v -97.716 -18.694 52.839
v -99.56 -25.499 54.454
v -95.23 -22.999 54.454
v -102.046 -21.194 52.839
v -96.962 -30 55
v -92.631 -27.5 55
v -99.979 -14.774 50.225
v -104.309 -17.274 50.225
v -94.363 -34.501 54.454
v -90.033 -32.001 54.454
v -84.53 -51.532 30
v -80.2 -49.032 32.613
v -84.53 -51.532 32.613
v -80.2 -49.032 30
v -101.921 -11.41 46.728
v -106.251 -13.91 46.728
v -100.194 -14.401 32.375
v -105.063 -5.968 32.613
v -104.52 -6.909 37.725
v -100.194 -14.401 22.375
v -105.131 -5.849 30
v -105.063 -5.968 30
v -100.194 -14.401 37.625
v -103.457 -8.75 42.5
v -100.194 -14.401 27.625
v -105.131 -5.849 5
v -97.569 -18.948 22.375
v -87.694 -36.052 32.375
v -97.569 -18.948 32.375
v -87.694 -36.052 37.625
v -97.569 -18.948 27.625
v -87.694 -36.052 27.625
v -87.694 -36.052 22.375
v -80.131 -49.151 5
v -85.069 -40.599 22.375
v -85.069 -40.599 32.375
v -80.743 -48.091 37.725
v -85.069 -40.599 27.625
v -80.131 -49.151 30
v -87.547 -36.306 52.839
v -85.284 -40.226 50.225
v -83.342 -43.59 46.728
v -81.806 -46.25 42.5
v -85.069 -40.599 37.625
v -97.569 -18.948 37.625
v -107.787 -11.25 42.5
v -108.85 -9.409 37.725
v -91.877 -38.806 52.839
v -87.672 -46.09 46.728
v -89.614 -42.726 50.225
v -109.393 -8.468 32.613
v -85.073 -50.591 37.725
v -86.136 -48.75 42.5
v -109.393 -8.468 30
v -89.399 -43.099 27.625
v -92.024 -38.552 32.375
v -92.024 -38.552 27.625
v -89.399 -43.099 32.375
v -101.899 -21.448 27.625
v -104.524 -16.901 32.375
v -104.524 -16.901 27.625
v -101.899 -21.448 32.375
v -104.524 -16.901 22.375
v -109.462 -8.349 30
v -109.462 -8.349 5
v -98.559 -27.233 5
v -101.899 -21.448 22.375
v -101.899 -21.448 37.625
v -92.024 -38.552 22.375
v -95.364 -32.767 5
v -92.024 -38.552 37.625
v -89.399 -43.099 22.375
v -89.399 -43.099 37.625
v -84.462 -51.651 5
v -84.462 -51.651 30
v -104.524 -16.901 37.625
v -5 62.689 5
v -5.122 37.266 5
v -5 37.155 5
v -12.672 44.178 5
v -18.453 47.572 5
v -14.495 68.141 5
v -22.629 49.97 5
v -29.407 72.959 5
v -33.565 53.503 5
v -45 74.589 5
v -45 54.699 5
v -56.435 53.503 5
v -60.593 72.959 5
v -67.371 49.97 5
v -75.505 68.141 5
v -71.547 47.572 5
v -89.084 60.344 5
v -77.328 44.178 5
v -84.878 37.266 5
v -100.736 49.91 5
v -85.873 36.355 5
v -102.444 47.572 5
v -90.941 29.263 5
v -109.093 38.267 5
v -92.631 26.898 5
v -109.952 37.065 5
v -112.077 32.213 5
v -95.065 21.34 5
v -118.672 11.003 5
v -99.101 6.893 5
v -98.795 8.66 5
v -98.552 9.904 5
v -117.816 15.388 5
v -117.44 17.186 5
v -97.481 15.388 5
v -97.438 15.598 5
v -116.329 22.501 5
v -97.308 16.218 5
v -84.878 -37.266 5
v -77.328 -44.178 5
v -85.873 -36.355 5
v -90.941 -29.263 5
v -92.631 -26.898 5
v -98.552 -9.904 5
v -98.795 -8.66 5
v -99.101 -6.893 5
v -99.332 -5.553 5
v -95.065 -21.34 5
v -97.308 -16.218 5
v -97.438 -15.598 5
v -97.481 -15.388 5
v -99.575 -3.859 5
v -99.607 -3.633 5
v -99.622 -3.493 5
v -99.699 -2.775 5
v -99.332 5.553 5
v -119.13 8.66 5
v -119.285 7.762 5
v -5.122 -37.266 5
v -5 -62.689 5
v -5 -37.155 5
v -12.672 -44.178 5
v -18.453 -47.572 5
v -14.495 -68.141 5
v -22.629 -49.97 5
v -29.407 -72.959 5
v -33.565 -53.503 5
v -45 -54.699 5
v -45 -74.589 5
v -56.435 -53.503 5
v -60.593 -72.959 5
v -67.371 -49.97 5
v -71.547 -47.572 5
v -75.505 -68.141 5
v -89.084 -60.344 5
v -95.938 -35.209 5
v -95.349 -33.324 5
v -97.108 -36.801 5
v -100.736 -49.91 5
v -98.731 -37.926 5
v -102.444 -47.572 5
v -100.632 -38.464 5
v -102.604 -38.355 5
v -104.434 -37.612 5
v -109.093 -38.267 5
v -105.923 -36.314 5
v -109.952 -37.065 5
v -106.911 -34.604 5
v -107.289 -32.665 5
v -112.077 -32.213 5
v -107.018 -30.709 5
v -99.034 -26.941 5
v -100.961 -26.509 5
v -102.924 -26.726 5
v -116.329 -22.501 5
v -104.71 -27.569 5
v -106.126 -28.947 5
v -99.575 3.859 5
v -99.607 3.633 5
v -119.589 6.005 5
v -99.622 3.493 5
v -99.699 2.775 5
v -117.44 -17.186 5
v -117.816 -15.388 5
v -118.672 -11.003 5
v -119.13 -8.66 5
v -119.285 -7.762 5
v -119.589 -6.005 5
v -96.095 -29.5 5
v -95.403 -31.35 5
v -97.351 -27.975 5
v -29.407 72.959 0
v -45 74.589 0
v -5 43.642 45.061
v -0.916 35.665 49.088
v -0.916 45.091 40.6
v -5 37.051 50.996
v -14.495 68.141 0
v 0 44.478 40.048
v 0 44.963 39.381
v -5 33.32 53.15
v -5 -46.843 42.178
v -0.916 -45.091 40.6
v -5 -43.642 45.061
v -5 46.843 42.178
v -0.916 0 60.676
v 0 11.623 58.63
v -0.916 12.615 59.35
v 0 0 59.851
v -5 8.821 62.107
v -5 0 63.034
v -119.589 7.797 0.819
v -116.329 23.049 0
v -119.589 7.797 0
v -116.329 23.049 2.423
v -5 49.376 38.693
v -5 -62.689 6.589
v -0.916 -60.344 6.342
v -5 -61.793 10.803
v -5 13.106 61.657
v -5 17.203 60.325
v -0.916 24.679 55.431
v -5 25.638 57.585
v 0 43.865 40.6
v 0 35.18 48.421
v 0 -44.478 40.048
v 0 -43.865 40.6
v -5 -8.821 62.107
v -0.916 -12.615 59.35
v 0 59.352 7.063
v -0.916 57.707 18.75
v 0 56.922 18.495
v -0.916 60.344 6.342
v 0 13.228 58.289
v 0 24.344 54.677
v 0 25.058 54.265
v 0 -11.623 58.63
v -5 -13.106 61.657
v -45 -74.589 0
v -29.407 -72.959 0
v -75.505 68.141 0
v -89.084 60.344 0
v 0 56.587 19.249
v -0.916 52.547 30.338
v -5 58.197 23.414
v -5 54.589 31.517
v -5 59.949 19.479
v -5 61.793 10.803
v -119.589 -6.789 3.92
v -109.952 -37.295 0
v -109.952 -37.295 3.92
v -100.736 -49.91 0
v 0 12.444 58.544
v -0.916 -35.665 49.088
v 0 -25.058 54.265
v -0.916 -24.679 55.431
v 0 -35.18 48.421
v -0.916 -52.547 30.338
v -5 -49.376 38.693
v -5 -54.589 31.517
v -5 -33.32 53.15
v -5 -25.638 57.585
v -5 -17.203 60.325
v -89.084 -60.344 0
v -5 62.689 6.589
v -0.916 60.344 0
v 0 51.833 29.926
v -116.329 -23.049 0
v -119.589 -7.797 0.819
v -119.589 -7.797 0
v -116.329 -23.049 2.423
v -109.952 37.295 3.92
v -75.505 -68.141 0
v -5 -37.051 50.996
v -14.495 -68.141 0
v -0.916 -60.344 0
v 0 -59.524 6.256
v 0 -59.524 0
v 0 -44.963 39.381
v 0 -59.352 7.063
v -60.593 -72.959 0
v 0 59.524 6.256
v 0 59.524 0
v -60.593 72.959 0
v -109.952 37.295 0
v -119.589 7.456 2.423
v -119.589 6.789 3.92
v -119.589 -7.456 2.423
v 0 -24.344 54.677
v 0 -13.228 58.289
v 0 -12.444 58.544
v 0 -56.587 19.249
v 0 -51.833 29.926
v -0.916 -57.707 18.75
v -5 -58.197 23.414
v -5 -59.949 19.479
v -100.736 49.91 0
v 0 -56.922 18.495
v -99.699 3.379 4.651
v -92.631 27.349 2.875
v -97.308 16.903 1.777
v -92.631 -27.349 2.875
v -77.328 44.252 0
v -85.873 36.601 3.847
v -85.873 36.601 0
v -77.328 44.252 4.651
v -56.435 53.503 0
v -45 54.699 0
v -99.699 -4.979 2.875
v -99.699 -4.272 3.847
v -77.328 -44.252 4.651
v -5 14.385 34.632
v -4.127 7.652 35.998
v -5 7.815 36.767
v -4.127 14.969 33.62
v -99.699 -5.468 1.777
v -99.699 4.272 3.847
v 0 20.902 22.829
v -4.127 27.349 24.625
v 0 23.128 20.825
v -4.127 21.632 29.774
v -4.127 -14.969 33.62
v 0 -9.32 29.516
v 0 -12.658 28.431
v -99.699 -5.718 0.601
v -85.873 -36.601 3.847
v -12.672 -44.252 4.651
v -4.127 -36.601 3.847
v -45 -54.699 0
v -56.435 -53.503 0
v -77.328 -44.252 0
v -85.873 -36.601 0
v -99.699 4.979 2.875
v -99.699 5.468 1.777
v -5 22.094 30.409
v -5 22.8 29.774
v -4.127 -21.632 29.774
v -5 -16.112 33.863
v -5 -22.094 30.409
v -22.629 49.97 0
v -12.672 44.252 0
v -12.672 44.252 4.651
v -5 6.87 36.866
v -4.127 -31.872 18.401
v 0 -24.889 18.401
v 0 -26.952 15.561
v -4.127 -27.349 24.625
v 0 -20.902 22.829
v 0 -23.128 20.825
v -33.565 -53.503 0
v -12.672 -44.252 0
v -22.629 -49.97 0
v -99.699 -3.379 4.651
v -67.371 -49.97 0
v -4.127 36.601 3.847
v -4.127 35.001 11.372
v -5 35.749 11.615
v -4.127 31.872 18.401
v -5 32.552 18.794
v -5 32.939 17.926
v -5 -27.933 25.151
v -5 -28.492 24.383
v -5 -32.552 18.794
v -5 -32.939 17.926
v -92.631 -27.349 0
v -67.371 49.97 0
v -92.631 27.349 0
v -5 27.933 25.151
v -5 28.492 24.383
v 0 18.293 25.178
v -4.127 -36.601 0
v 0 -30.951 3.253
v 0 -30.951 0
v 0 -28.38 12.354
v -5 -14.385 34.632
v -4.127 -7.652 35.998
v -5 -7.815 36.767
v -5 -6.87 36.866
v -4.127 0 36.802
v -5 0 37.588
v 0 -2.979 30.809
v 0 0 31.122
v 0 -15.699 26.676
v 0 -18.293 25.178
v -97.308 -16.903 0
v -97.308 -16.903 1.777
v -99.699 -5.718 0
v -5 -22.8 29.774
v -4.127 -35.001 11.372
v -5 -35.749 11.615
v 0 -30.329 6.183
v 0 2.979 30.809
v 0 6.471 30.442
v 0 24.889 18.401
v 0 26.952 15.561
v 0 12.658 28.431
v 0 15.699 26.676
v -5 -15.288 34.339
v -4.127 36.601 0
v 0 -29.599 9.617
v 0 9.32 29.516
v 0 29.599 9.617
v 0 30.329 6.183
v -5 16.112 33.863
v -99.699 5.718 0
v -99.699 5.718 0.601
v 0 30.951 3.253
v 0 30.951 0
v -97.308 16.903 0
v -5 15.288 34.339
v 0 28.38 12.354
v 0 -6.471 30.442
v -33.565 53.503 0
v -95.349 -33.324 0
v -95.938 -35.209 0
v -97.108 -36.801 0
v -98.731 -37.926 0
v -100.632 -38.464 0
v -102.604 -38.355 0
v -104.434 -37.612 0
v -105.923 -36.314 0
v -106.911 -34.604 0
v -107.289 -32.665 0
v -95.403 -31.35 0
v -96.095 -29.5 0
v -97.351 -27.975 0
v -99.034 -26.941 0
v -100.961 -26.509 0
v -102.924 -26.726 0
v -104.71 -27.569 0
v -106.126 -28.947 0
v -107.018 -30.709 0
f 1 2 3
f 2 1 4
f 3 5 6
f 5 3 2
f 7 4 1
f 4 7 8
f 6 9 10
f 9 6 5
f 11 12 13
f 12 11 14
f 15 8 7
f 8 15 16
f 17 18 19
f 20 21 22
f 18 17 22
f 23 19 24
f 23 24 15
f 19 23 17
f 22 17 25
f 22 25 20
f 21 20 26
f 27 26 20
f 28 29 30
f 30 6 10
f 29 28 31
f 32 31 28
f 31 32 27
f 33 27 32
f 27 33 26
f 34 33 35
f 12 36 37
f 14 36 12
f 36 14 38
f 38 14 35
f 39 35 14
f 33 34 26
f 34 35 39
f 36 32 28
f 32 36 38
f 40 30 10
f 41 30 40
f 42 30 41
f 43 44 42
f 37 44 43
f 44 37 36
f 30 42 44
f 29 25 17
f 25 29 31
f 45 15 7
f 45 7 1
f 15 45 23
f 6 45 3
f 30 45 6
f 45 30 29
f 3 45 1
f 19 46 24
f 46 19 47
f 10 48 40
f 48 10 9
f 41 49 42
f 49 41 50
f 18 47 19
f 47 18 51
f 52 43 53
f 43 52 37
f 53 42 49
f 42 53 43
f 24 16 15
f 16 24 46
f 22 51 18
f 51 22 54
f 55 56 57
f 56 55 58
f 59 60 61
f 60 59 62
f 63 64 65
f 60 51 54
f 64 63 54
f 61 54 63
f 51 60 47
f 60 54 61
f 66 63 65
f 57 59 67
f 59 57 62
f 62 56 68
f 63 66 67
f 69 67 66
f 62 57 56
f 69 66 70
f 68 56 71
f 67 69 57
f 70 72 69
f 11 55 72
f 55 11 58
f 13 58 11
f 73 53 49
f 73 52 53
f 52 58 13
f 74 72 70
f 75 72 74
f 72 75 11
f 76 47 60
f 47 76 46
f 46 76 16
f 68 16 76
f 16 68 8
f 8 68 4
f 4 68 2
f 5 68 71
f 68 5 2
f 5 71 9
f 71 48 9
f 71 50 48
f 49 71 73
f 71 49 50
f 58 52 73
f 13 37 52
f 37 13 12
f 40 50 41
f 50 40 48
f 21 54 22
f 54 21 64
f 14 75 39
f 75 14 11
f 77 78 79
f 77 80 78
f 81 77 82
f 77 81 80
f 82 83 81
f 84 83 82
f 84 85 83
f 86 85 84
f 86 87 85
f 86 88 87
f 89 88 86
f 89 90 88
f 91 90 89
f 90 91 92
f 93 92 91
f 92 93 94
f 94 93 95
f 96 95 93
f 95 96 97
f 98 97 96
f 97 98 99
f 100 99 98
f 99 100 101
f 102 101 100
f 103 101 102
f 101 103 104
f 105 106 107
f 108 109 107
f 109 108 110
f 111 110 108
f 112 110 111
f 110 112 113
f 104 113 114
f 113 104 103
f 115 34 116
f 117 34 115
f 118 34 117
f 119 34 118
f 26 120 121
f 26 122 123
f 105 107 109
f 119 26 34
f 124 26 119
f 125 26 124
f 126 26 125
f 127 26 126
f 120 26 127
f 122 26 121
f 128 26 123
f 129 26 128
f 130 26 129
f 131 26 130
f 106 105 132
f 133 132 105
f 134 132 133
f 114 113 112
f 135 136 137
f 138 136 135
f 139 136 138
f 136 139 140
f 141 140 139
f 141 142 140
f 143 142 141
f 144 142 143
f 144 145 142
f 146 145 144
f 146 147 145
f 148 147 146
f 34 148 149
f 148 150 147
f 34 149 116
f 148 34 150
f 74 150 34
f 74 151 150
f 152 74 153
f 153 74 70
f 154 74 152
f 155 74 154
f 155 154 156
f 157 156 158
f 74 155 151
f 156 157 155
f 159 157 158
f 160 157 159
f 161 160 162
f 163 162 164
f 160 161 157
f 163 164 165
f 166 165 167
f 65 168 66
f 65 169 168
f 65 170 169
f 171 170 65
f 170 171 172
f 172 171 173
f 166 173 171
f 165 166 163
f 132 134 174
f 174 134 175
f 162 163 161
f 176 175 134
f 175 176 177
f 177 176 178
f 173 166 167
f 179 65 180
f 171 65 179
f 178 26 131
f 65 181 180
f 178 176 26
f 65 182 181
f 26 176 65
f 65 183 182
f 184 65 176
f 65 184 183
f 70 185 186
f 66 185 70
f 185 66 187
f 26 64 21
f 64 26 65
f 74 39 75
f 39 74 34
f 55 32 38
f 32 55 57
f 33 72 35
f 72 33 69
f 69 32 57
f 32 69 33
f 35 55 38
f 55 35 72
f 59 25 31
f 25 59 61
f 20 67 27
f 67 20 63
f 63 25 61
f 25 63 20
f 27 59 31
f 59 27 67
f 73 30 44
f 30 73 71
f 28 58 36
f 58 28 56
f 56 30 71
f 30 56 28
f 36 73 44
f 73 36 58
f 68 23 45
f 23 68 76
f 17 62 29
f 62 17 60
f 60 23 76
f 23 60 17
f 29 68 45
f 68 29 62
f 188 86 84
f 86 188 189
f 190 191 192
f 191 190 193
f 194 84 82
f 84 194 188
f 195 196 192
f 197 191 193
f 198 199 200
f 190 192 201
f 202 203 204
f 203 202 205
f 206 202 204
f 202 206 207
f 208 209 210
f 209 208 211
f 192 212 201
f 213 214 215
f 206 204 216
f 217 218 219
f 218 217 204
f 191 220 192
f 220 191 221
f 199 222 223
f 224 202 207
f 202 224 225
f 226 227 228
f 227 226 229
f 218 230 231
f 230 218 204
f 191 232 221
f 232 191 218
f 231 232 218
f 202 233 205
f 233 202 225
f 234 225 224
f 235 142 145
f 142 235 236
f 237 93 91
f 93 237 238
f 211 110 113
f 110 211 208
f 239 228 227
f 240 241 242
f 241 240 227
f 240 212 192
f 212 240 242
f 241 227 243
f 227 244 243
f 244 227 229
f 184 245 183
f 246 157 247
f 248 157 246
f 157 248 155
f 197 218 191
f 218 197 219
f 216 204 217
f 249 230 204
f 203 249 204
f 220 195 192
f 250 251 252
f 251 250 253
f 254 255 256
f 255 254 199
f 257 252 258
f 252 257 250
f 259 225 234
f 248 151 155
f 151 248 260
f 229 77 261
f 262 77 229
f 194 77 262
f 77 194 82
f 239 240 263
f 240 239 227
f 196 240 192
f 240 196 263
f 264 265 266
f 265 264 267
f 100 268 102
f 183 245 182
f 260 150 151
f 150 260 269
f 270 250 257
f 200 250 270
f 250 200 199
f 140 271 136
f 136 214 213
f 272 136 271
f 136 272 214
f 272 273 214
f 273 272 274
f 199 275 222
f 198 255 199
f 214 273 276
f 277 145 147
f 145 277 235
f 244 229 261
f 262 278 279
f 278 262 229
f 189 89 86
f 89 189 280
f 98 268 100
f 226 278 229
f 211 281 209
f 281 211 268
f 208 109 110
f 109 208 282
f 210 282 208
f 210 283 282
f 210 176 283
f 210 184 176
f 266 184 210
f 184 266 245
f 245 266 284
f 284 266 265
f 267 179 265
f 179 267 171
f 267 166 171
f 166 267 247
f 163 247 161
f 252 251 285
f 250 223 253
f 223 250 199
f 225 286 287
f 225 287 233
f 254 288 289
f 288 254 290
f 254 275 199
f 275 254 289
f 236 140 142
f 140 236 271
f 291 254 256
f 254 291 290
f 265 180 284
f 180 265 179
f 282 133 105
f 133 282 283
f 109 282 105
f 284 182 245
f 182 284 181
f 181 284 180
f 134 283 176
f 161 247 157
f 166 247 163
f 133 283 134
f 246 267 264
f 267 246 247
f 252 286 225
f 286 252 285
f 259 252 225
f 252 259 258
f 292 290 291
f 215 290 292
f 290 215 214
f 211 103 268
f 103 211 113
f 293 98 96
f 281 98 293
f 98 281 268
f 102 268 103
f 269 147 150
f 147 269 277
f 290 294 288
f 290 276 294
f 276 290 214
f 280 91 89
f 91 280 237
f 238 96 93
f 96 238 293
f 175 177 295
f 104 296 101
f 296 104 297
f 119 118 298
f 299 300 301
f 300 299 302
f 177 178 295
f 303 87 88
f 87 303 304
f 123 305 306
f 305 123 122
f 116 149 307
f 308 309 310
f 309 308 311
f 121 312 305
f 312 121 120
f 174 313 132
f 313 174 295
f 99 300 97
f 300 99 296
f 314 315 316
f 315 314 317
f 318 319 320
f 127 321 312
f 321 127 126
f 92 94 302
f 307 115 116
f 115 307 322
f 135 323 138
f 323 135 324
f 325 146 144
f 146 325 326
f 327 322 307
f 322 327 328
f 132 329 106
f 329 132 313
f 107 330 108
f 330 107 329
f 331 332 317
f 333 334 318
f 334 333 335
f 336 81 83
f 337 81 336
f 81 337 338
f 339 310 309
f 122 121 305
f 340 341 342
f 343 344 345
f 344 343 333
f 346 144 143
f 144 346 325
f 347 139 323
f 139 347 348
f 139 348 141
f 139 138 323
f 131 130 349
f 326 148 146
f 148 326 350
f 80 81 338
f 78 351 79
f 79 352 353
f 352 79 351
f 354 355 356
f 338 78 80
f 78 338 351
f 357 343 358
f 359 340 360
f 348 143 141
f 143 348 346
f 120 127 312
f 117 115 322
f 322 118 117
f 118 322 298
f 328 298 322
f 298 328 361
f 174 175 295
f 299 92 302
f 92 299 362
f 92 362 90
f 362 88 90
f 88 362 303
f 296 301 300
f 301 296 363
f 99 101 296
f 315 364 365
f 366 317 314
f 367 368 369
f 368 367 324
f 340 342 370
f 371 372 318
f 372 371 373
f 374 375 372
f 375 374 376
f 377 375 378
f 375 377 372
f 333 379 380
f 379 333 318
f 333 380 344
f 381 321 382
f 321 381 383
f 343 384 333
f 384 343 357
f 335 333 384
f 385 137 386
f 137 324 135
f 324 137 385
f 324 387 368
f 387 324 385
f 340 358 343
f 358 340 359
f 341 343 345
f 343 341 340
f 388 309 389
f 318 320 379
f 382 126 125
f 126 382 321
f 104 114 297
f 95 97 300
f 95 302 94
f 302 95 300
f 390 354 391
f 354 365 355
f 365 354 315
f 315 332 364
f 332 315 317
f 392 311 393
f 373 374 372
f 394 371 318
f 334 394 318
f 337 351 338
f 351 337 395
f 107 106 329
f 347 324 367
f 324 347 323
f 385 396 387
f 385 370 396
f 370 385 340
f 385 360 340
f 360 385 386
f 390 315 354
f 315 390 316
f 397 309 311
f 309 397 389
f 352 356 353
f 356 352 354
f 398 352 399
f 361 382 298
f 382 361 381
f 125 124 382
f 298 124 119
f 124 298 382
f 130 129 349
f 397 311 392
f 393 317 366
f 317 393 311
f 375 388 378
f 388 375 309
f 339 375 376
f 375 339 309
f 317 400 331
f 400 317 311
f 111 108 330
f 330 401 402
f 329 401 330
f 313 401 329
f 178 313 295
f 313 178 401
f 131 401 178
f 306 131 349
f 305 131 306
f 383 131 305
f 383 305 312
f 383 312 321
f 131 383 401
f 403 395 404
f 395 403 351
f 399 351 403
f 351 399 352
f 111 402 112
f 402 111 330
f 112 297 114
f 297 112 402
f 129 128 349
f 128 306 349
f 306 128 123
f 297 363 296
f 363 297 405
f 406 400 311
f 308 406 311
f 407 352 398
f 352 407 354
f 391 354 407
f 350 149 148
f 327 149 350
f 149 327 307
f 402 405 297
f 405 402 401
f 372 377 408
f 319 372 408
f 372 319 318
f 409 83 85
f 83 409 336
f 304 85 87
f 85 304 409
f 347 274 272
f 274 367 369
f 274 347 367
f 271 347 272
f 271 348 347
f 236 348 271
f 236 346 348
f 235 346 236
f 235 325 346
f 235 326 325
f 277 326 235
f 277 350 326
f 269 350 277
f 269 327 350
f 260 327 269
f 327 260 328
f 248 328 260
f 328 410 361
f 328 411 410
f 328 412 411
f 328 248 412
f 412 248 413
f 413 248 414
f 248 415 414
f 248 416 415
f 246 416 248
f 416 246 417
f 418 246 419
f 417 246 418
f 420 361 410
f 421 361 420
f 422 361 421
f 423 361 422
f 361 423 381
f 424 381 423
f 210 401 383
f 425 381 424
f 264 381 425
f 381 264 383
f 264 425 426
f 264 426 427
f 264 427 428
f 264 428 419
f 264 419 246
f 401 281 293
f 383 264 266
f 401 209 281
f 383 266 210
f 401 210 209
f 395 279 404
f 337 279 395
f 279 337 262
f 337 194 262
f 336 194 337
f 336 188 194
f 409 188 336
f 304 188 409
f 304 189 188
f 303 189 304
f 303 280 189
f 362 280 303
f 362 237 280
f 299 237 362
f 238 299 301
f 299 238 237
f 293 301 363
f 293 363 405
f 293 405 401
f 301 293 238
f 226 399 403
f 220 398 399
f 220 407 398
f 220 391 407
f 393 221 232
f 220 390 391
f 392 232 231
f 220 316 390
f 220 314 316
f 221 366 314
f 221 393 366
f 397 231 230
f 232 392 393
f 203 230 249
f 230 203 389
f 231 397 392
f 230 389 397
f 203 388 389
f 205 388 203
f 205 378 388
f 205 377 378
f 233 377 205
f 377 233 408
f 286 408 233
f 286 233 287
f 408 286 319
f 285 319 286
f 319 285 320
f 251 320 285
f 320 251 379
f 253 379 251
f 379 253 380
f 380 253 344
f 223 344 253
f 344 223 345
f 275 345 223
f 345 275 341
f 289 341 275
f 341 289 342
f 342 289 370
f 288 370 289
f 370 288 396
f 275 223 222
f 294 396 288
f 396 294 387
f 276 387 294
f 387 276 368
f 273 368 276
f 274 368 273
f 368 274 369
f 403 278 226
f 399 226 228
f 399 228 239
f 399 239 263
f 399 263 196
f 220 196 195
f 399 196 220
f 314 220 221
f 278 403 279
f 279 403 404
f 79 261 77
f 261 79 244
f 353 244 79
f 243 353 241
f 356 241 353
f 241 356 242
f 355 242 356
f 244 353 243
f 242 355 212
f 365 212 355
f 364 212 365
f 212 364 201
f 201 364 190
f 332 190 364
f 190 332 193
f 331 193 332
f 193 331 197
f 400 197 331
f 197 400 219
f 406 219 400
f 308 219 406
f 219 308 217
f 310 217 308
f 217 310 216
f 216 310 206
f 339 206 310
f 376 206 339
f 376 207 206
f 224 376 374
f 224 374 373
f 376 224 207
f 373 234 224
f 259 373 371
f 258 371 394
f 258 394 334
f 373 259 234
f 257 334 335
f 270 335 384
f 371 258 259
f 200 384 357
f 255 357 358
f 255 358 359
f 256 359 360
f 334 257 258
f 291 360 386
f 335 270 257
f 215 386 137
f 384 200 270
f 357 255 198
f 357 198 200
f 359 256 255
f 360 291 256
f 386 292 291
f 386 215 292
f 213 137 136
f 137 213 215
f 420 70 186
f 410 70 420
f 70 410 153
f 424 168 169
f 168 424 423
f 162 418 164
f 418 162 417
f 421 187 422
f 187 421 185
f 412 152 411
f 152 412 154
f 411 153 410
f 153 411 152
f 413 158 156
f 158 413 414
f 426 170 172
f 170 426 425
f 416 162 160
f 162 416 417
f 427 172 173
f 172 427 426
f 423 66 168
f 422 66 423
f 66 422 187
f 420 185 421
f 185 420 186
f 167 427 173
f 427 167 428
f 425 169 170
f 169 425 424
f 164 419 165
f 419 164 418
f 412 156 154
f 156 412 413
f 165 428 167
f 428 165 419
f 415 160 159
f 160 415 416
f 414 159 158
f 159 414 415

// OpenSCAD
/* [Global] */

// Is the charger round or square?
charger_type = "round"; // [round:Round - Urbane and G Watch R,square:Square - G Watch]
// How thick is the part that holds the charger?
charge_pad_thick = 5;
// How wide for square chargers
charge_pad_wide  = 39;
// How long for square chargers
charge_pad_long  = 48;
// Diameter for round chargers
charge_pad_d     = 50;
// Angle of charging pad
charge_pad_angle = 30;


// How thick are your magnets?
magnet_thick = 5.25;
// How wide/long are your magnets?
magnet_wide  = 5.25;

// How far apart are the magnet centers across the width?
magnet_sep_w = 10;  // 16 = G, 10 = Urbane
// How far apart are the magnet centers across the length?
magnet_sep_h = 25;  // 16 = G, 25 = Urbane

// Frame outer radius
frame_or = 75;
// Frame inner radius
frame_ir = 55;
// Frame thickness
frame_thick = 5;

// Height of frame
frame_h= 110;

// Offset of USB port from bottom of charger
usb_offset = 5;
// Radius of hole for USB plug
usb_r = 6;

/* [Hidden] */

// Arbitrarily large number.
huge = 500;

// Frame center radius
middle = ((frame_or - frame_ir) / 2) + frame_ir;

// Charge pad radius
charge_pad_r = charge_pad_d/2;


rotate([0,-90,0])
{
  translate([0,0,frame_h-middle]) rotate([charge_pad_angle,0,0]) translate([frame_thick,0, frame_ir]) top();
  difference()
  {
    frame();
    translate([0,0,frame_h-middle]) rotate([charge_pad_angle,0,0]) translate([-huge/2,0,frame_ir + charge_pad_thick + usb_offset]) rotate([0,90,0]) cylinder(r=usb_r,h=huge);
  }
}

//top("square");
//translate([0,0,30]) top("round");



module frame()
{
  difference()
  {
    union()
    {
      translate([0,0,frame_h - middle])
      {
        difference()
        {
          sphere(r=frame_or);
          sphere(r=frame_ir);
        }
      }
    }

    translate([-huge/2,0,0]) cube([huge,huge,huge],center=true);
    translate([0,0,-huge/2]) cube([huge,huge,huge],center=true);
    translate([frame_thick,-huge/2,frame_thick]) cube([huge,huge,huge]);

  }
}

module top(ct = charger_type)
{
  if(ct == "square")
  {
    translate([0,-charge_pad_long/2,0])
    difference()
    {
      cube([charge_pad_wide, charge_pad_long, charge_pad_thick]);
      
      for(x = [(charge_pad_wide-magnet_sep_w)/2, (charge_pad_wide-magnet_sep_w)/2 + magnet_sep_w])
      {
        for(y = [(charge_pad_long-magnet_sep_h)/2, (charge_pad_long-magnet_sep_h)/2 + magnet_sep_h])
        {
          #translate([x,y,charge_pad_thick - magnet_thick + (magnet_thick)/2]) cube([magnet_wide, magnet_wide, magnet_thick+1], center=true);
        }
      }
    }
  }
  else
  {
    translate([0,-charge_pad_r,0])
    difference()
    {
      union()
      {
        translate([charge_pad_r, charge_pad_r, 0]) cylinder(r=charge_pad_r,h=charge_pad_thick);
        cube([charge_pad_r, charge_pad_d, charge_pad_thick]);
      }

      for(x = [(charge_pad_d-magnet_sep_w)/2, (charge_pad_d-magnet_sep_w)/2 + magnet_sep_w])
      {
        for(y = [(charge_pad_d-magnet_sep_h)/2, (charge_pad_d-magnet_sep_h)/2 + magnet_sep_h])
        {
          #translate([x,y,charge_pad_thick - magnet_thick + (magnet_thick)/2]) cube([magnet_wide, magnet_wide, magnet_thick+1], center=true);
        }
      }
    }
  }
}
